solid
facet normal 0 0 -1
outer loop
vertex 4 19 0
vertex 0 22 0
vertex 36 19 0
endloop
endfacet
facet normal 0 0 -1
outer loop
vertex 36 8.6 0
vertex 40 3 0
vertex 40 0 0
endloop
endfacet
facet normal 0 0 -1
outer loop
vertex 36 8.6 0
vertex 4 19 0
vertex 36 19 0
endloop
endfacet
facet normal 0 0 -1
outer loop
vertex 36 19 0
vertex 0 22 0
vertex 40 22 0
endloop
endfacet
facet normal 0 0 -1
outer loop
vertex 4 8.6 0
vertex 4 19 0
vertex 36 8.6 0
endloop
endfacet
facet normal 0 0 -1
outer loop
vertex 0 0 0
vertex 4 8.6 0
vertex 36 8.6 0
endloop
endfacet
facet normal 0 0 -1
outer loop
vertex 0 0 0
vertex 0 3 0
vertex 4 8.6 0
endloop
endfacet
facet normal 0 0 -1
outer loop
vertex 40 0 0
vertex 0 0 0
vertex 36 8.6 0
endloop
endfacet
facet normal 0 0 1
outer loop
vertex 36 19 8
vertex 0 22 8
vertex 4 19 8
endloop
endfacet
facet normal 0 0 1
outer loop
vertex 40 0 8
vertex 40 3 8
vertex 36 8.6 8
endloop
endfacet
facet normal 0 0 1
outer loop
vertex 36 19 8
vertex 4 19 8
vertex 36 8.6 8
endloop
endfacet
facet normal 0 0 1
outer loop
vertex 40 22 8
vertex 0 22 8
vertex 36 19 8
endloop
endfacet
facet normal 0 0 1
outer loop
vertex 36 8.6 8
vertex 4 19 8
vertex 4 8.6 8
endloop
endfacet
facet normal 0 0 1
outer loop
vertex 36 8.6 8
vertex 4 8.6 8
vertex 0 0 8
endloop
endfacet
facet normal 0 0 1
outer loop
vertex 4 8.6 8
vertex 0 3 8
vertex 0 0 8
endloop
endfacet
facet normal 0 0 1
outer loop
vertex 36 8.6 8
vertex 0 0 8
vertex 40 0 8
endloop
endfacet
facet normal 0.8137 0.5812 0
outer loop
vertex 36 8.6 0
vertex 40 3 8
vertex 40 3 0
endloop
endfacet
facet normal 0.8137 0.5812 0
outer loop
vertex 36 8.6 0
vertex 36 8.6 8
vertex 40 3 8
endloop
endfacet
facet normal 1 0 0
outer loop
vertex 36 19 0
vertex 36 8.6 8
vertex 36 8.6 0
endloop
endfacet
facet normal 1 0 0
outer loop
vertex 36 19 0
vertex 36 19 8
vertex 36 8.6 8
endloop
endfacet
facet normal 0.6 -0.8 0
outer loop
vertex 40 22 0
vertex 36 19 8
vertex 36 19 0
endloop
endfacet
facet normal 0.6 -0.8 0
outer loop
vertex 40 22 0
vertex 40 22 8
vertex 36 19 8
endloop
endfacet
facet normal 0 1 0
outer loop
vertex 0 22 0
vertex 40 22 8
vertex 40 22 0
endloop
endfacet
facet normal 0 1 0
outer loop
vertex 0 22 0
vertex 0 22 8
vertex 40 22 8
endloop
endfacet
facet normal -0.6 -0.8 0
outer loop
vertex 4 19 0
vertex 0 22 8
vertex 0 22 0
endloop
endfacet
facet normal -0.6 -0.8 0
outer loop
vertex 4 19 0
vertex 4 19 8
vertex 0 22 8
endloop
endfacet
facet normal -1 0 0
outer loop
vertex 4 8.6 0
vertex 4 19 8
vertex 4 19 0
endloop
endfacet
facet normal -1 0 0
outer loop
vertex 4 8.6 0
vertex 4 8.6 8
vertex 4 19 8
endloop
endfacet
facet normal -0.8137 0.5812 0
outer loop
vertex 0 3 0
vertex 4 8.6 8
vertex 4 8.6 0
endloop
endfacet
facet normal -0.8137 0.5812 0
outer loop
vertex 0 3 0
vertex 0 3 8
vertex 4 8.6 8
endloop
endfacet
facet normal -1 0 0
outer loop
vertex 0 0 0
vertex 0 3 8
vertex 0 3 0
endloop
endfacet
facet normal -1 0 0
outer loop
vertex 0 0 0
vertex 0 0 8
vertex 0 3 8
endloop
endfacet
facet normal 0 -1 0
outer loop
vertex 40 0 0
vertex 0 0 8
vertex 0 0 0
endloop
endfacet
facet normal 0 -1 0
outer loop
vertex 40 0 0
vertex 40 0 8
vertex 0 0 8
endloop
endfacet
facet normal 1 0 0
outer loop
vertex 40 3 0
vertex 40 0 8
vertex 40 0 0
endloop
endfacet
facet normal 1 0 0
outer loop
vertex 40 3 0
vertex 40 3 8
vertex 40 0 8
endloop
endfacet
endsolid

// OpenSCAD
$fn = 32;

// ----------------------------------------------------------------------
// Key bar: dovetail key, 8 mm thick
// ----------------------------------------------------------------------

// --- parameters (mm) ---
profile_height = 8;       // extrusion height
profile_points = 10;      // points of the closed outline

profile = [[0, 0], [40, 0], [40, 3], [36, 8.6], [36, 19], [40, 22], [0, 22], [4, 19], [4, 8.6], [0, 3]];  // single closed polygon, 10 points, counter clockwise

// --- the one profile operation ---
linear_extrude(height = profile_height) polygon(points = profile);
